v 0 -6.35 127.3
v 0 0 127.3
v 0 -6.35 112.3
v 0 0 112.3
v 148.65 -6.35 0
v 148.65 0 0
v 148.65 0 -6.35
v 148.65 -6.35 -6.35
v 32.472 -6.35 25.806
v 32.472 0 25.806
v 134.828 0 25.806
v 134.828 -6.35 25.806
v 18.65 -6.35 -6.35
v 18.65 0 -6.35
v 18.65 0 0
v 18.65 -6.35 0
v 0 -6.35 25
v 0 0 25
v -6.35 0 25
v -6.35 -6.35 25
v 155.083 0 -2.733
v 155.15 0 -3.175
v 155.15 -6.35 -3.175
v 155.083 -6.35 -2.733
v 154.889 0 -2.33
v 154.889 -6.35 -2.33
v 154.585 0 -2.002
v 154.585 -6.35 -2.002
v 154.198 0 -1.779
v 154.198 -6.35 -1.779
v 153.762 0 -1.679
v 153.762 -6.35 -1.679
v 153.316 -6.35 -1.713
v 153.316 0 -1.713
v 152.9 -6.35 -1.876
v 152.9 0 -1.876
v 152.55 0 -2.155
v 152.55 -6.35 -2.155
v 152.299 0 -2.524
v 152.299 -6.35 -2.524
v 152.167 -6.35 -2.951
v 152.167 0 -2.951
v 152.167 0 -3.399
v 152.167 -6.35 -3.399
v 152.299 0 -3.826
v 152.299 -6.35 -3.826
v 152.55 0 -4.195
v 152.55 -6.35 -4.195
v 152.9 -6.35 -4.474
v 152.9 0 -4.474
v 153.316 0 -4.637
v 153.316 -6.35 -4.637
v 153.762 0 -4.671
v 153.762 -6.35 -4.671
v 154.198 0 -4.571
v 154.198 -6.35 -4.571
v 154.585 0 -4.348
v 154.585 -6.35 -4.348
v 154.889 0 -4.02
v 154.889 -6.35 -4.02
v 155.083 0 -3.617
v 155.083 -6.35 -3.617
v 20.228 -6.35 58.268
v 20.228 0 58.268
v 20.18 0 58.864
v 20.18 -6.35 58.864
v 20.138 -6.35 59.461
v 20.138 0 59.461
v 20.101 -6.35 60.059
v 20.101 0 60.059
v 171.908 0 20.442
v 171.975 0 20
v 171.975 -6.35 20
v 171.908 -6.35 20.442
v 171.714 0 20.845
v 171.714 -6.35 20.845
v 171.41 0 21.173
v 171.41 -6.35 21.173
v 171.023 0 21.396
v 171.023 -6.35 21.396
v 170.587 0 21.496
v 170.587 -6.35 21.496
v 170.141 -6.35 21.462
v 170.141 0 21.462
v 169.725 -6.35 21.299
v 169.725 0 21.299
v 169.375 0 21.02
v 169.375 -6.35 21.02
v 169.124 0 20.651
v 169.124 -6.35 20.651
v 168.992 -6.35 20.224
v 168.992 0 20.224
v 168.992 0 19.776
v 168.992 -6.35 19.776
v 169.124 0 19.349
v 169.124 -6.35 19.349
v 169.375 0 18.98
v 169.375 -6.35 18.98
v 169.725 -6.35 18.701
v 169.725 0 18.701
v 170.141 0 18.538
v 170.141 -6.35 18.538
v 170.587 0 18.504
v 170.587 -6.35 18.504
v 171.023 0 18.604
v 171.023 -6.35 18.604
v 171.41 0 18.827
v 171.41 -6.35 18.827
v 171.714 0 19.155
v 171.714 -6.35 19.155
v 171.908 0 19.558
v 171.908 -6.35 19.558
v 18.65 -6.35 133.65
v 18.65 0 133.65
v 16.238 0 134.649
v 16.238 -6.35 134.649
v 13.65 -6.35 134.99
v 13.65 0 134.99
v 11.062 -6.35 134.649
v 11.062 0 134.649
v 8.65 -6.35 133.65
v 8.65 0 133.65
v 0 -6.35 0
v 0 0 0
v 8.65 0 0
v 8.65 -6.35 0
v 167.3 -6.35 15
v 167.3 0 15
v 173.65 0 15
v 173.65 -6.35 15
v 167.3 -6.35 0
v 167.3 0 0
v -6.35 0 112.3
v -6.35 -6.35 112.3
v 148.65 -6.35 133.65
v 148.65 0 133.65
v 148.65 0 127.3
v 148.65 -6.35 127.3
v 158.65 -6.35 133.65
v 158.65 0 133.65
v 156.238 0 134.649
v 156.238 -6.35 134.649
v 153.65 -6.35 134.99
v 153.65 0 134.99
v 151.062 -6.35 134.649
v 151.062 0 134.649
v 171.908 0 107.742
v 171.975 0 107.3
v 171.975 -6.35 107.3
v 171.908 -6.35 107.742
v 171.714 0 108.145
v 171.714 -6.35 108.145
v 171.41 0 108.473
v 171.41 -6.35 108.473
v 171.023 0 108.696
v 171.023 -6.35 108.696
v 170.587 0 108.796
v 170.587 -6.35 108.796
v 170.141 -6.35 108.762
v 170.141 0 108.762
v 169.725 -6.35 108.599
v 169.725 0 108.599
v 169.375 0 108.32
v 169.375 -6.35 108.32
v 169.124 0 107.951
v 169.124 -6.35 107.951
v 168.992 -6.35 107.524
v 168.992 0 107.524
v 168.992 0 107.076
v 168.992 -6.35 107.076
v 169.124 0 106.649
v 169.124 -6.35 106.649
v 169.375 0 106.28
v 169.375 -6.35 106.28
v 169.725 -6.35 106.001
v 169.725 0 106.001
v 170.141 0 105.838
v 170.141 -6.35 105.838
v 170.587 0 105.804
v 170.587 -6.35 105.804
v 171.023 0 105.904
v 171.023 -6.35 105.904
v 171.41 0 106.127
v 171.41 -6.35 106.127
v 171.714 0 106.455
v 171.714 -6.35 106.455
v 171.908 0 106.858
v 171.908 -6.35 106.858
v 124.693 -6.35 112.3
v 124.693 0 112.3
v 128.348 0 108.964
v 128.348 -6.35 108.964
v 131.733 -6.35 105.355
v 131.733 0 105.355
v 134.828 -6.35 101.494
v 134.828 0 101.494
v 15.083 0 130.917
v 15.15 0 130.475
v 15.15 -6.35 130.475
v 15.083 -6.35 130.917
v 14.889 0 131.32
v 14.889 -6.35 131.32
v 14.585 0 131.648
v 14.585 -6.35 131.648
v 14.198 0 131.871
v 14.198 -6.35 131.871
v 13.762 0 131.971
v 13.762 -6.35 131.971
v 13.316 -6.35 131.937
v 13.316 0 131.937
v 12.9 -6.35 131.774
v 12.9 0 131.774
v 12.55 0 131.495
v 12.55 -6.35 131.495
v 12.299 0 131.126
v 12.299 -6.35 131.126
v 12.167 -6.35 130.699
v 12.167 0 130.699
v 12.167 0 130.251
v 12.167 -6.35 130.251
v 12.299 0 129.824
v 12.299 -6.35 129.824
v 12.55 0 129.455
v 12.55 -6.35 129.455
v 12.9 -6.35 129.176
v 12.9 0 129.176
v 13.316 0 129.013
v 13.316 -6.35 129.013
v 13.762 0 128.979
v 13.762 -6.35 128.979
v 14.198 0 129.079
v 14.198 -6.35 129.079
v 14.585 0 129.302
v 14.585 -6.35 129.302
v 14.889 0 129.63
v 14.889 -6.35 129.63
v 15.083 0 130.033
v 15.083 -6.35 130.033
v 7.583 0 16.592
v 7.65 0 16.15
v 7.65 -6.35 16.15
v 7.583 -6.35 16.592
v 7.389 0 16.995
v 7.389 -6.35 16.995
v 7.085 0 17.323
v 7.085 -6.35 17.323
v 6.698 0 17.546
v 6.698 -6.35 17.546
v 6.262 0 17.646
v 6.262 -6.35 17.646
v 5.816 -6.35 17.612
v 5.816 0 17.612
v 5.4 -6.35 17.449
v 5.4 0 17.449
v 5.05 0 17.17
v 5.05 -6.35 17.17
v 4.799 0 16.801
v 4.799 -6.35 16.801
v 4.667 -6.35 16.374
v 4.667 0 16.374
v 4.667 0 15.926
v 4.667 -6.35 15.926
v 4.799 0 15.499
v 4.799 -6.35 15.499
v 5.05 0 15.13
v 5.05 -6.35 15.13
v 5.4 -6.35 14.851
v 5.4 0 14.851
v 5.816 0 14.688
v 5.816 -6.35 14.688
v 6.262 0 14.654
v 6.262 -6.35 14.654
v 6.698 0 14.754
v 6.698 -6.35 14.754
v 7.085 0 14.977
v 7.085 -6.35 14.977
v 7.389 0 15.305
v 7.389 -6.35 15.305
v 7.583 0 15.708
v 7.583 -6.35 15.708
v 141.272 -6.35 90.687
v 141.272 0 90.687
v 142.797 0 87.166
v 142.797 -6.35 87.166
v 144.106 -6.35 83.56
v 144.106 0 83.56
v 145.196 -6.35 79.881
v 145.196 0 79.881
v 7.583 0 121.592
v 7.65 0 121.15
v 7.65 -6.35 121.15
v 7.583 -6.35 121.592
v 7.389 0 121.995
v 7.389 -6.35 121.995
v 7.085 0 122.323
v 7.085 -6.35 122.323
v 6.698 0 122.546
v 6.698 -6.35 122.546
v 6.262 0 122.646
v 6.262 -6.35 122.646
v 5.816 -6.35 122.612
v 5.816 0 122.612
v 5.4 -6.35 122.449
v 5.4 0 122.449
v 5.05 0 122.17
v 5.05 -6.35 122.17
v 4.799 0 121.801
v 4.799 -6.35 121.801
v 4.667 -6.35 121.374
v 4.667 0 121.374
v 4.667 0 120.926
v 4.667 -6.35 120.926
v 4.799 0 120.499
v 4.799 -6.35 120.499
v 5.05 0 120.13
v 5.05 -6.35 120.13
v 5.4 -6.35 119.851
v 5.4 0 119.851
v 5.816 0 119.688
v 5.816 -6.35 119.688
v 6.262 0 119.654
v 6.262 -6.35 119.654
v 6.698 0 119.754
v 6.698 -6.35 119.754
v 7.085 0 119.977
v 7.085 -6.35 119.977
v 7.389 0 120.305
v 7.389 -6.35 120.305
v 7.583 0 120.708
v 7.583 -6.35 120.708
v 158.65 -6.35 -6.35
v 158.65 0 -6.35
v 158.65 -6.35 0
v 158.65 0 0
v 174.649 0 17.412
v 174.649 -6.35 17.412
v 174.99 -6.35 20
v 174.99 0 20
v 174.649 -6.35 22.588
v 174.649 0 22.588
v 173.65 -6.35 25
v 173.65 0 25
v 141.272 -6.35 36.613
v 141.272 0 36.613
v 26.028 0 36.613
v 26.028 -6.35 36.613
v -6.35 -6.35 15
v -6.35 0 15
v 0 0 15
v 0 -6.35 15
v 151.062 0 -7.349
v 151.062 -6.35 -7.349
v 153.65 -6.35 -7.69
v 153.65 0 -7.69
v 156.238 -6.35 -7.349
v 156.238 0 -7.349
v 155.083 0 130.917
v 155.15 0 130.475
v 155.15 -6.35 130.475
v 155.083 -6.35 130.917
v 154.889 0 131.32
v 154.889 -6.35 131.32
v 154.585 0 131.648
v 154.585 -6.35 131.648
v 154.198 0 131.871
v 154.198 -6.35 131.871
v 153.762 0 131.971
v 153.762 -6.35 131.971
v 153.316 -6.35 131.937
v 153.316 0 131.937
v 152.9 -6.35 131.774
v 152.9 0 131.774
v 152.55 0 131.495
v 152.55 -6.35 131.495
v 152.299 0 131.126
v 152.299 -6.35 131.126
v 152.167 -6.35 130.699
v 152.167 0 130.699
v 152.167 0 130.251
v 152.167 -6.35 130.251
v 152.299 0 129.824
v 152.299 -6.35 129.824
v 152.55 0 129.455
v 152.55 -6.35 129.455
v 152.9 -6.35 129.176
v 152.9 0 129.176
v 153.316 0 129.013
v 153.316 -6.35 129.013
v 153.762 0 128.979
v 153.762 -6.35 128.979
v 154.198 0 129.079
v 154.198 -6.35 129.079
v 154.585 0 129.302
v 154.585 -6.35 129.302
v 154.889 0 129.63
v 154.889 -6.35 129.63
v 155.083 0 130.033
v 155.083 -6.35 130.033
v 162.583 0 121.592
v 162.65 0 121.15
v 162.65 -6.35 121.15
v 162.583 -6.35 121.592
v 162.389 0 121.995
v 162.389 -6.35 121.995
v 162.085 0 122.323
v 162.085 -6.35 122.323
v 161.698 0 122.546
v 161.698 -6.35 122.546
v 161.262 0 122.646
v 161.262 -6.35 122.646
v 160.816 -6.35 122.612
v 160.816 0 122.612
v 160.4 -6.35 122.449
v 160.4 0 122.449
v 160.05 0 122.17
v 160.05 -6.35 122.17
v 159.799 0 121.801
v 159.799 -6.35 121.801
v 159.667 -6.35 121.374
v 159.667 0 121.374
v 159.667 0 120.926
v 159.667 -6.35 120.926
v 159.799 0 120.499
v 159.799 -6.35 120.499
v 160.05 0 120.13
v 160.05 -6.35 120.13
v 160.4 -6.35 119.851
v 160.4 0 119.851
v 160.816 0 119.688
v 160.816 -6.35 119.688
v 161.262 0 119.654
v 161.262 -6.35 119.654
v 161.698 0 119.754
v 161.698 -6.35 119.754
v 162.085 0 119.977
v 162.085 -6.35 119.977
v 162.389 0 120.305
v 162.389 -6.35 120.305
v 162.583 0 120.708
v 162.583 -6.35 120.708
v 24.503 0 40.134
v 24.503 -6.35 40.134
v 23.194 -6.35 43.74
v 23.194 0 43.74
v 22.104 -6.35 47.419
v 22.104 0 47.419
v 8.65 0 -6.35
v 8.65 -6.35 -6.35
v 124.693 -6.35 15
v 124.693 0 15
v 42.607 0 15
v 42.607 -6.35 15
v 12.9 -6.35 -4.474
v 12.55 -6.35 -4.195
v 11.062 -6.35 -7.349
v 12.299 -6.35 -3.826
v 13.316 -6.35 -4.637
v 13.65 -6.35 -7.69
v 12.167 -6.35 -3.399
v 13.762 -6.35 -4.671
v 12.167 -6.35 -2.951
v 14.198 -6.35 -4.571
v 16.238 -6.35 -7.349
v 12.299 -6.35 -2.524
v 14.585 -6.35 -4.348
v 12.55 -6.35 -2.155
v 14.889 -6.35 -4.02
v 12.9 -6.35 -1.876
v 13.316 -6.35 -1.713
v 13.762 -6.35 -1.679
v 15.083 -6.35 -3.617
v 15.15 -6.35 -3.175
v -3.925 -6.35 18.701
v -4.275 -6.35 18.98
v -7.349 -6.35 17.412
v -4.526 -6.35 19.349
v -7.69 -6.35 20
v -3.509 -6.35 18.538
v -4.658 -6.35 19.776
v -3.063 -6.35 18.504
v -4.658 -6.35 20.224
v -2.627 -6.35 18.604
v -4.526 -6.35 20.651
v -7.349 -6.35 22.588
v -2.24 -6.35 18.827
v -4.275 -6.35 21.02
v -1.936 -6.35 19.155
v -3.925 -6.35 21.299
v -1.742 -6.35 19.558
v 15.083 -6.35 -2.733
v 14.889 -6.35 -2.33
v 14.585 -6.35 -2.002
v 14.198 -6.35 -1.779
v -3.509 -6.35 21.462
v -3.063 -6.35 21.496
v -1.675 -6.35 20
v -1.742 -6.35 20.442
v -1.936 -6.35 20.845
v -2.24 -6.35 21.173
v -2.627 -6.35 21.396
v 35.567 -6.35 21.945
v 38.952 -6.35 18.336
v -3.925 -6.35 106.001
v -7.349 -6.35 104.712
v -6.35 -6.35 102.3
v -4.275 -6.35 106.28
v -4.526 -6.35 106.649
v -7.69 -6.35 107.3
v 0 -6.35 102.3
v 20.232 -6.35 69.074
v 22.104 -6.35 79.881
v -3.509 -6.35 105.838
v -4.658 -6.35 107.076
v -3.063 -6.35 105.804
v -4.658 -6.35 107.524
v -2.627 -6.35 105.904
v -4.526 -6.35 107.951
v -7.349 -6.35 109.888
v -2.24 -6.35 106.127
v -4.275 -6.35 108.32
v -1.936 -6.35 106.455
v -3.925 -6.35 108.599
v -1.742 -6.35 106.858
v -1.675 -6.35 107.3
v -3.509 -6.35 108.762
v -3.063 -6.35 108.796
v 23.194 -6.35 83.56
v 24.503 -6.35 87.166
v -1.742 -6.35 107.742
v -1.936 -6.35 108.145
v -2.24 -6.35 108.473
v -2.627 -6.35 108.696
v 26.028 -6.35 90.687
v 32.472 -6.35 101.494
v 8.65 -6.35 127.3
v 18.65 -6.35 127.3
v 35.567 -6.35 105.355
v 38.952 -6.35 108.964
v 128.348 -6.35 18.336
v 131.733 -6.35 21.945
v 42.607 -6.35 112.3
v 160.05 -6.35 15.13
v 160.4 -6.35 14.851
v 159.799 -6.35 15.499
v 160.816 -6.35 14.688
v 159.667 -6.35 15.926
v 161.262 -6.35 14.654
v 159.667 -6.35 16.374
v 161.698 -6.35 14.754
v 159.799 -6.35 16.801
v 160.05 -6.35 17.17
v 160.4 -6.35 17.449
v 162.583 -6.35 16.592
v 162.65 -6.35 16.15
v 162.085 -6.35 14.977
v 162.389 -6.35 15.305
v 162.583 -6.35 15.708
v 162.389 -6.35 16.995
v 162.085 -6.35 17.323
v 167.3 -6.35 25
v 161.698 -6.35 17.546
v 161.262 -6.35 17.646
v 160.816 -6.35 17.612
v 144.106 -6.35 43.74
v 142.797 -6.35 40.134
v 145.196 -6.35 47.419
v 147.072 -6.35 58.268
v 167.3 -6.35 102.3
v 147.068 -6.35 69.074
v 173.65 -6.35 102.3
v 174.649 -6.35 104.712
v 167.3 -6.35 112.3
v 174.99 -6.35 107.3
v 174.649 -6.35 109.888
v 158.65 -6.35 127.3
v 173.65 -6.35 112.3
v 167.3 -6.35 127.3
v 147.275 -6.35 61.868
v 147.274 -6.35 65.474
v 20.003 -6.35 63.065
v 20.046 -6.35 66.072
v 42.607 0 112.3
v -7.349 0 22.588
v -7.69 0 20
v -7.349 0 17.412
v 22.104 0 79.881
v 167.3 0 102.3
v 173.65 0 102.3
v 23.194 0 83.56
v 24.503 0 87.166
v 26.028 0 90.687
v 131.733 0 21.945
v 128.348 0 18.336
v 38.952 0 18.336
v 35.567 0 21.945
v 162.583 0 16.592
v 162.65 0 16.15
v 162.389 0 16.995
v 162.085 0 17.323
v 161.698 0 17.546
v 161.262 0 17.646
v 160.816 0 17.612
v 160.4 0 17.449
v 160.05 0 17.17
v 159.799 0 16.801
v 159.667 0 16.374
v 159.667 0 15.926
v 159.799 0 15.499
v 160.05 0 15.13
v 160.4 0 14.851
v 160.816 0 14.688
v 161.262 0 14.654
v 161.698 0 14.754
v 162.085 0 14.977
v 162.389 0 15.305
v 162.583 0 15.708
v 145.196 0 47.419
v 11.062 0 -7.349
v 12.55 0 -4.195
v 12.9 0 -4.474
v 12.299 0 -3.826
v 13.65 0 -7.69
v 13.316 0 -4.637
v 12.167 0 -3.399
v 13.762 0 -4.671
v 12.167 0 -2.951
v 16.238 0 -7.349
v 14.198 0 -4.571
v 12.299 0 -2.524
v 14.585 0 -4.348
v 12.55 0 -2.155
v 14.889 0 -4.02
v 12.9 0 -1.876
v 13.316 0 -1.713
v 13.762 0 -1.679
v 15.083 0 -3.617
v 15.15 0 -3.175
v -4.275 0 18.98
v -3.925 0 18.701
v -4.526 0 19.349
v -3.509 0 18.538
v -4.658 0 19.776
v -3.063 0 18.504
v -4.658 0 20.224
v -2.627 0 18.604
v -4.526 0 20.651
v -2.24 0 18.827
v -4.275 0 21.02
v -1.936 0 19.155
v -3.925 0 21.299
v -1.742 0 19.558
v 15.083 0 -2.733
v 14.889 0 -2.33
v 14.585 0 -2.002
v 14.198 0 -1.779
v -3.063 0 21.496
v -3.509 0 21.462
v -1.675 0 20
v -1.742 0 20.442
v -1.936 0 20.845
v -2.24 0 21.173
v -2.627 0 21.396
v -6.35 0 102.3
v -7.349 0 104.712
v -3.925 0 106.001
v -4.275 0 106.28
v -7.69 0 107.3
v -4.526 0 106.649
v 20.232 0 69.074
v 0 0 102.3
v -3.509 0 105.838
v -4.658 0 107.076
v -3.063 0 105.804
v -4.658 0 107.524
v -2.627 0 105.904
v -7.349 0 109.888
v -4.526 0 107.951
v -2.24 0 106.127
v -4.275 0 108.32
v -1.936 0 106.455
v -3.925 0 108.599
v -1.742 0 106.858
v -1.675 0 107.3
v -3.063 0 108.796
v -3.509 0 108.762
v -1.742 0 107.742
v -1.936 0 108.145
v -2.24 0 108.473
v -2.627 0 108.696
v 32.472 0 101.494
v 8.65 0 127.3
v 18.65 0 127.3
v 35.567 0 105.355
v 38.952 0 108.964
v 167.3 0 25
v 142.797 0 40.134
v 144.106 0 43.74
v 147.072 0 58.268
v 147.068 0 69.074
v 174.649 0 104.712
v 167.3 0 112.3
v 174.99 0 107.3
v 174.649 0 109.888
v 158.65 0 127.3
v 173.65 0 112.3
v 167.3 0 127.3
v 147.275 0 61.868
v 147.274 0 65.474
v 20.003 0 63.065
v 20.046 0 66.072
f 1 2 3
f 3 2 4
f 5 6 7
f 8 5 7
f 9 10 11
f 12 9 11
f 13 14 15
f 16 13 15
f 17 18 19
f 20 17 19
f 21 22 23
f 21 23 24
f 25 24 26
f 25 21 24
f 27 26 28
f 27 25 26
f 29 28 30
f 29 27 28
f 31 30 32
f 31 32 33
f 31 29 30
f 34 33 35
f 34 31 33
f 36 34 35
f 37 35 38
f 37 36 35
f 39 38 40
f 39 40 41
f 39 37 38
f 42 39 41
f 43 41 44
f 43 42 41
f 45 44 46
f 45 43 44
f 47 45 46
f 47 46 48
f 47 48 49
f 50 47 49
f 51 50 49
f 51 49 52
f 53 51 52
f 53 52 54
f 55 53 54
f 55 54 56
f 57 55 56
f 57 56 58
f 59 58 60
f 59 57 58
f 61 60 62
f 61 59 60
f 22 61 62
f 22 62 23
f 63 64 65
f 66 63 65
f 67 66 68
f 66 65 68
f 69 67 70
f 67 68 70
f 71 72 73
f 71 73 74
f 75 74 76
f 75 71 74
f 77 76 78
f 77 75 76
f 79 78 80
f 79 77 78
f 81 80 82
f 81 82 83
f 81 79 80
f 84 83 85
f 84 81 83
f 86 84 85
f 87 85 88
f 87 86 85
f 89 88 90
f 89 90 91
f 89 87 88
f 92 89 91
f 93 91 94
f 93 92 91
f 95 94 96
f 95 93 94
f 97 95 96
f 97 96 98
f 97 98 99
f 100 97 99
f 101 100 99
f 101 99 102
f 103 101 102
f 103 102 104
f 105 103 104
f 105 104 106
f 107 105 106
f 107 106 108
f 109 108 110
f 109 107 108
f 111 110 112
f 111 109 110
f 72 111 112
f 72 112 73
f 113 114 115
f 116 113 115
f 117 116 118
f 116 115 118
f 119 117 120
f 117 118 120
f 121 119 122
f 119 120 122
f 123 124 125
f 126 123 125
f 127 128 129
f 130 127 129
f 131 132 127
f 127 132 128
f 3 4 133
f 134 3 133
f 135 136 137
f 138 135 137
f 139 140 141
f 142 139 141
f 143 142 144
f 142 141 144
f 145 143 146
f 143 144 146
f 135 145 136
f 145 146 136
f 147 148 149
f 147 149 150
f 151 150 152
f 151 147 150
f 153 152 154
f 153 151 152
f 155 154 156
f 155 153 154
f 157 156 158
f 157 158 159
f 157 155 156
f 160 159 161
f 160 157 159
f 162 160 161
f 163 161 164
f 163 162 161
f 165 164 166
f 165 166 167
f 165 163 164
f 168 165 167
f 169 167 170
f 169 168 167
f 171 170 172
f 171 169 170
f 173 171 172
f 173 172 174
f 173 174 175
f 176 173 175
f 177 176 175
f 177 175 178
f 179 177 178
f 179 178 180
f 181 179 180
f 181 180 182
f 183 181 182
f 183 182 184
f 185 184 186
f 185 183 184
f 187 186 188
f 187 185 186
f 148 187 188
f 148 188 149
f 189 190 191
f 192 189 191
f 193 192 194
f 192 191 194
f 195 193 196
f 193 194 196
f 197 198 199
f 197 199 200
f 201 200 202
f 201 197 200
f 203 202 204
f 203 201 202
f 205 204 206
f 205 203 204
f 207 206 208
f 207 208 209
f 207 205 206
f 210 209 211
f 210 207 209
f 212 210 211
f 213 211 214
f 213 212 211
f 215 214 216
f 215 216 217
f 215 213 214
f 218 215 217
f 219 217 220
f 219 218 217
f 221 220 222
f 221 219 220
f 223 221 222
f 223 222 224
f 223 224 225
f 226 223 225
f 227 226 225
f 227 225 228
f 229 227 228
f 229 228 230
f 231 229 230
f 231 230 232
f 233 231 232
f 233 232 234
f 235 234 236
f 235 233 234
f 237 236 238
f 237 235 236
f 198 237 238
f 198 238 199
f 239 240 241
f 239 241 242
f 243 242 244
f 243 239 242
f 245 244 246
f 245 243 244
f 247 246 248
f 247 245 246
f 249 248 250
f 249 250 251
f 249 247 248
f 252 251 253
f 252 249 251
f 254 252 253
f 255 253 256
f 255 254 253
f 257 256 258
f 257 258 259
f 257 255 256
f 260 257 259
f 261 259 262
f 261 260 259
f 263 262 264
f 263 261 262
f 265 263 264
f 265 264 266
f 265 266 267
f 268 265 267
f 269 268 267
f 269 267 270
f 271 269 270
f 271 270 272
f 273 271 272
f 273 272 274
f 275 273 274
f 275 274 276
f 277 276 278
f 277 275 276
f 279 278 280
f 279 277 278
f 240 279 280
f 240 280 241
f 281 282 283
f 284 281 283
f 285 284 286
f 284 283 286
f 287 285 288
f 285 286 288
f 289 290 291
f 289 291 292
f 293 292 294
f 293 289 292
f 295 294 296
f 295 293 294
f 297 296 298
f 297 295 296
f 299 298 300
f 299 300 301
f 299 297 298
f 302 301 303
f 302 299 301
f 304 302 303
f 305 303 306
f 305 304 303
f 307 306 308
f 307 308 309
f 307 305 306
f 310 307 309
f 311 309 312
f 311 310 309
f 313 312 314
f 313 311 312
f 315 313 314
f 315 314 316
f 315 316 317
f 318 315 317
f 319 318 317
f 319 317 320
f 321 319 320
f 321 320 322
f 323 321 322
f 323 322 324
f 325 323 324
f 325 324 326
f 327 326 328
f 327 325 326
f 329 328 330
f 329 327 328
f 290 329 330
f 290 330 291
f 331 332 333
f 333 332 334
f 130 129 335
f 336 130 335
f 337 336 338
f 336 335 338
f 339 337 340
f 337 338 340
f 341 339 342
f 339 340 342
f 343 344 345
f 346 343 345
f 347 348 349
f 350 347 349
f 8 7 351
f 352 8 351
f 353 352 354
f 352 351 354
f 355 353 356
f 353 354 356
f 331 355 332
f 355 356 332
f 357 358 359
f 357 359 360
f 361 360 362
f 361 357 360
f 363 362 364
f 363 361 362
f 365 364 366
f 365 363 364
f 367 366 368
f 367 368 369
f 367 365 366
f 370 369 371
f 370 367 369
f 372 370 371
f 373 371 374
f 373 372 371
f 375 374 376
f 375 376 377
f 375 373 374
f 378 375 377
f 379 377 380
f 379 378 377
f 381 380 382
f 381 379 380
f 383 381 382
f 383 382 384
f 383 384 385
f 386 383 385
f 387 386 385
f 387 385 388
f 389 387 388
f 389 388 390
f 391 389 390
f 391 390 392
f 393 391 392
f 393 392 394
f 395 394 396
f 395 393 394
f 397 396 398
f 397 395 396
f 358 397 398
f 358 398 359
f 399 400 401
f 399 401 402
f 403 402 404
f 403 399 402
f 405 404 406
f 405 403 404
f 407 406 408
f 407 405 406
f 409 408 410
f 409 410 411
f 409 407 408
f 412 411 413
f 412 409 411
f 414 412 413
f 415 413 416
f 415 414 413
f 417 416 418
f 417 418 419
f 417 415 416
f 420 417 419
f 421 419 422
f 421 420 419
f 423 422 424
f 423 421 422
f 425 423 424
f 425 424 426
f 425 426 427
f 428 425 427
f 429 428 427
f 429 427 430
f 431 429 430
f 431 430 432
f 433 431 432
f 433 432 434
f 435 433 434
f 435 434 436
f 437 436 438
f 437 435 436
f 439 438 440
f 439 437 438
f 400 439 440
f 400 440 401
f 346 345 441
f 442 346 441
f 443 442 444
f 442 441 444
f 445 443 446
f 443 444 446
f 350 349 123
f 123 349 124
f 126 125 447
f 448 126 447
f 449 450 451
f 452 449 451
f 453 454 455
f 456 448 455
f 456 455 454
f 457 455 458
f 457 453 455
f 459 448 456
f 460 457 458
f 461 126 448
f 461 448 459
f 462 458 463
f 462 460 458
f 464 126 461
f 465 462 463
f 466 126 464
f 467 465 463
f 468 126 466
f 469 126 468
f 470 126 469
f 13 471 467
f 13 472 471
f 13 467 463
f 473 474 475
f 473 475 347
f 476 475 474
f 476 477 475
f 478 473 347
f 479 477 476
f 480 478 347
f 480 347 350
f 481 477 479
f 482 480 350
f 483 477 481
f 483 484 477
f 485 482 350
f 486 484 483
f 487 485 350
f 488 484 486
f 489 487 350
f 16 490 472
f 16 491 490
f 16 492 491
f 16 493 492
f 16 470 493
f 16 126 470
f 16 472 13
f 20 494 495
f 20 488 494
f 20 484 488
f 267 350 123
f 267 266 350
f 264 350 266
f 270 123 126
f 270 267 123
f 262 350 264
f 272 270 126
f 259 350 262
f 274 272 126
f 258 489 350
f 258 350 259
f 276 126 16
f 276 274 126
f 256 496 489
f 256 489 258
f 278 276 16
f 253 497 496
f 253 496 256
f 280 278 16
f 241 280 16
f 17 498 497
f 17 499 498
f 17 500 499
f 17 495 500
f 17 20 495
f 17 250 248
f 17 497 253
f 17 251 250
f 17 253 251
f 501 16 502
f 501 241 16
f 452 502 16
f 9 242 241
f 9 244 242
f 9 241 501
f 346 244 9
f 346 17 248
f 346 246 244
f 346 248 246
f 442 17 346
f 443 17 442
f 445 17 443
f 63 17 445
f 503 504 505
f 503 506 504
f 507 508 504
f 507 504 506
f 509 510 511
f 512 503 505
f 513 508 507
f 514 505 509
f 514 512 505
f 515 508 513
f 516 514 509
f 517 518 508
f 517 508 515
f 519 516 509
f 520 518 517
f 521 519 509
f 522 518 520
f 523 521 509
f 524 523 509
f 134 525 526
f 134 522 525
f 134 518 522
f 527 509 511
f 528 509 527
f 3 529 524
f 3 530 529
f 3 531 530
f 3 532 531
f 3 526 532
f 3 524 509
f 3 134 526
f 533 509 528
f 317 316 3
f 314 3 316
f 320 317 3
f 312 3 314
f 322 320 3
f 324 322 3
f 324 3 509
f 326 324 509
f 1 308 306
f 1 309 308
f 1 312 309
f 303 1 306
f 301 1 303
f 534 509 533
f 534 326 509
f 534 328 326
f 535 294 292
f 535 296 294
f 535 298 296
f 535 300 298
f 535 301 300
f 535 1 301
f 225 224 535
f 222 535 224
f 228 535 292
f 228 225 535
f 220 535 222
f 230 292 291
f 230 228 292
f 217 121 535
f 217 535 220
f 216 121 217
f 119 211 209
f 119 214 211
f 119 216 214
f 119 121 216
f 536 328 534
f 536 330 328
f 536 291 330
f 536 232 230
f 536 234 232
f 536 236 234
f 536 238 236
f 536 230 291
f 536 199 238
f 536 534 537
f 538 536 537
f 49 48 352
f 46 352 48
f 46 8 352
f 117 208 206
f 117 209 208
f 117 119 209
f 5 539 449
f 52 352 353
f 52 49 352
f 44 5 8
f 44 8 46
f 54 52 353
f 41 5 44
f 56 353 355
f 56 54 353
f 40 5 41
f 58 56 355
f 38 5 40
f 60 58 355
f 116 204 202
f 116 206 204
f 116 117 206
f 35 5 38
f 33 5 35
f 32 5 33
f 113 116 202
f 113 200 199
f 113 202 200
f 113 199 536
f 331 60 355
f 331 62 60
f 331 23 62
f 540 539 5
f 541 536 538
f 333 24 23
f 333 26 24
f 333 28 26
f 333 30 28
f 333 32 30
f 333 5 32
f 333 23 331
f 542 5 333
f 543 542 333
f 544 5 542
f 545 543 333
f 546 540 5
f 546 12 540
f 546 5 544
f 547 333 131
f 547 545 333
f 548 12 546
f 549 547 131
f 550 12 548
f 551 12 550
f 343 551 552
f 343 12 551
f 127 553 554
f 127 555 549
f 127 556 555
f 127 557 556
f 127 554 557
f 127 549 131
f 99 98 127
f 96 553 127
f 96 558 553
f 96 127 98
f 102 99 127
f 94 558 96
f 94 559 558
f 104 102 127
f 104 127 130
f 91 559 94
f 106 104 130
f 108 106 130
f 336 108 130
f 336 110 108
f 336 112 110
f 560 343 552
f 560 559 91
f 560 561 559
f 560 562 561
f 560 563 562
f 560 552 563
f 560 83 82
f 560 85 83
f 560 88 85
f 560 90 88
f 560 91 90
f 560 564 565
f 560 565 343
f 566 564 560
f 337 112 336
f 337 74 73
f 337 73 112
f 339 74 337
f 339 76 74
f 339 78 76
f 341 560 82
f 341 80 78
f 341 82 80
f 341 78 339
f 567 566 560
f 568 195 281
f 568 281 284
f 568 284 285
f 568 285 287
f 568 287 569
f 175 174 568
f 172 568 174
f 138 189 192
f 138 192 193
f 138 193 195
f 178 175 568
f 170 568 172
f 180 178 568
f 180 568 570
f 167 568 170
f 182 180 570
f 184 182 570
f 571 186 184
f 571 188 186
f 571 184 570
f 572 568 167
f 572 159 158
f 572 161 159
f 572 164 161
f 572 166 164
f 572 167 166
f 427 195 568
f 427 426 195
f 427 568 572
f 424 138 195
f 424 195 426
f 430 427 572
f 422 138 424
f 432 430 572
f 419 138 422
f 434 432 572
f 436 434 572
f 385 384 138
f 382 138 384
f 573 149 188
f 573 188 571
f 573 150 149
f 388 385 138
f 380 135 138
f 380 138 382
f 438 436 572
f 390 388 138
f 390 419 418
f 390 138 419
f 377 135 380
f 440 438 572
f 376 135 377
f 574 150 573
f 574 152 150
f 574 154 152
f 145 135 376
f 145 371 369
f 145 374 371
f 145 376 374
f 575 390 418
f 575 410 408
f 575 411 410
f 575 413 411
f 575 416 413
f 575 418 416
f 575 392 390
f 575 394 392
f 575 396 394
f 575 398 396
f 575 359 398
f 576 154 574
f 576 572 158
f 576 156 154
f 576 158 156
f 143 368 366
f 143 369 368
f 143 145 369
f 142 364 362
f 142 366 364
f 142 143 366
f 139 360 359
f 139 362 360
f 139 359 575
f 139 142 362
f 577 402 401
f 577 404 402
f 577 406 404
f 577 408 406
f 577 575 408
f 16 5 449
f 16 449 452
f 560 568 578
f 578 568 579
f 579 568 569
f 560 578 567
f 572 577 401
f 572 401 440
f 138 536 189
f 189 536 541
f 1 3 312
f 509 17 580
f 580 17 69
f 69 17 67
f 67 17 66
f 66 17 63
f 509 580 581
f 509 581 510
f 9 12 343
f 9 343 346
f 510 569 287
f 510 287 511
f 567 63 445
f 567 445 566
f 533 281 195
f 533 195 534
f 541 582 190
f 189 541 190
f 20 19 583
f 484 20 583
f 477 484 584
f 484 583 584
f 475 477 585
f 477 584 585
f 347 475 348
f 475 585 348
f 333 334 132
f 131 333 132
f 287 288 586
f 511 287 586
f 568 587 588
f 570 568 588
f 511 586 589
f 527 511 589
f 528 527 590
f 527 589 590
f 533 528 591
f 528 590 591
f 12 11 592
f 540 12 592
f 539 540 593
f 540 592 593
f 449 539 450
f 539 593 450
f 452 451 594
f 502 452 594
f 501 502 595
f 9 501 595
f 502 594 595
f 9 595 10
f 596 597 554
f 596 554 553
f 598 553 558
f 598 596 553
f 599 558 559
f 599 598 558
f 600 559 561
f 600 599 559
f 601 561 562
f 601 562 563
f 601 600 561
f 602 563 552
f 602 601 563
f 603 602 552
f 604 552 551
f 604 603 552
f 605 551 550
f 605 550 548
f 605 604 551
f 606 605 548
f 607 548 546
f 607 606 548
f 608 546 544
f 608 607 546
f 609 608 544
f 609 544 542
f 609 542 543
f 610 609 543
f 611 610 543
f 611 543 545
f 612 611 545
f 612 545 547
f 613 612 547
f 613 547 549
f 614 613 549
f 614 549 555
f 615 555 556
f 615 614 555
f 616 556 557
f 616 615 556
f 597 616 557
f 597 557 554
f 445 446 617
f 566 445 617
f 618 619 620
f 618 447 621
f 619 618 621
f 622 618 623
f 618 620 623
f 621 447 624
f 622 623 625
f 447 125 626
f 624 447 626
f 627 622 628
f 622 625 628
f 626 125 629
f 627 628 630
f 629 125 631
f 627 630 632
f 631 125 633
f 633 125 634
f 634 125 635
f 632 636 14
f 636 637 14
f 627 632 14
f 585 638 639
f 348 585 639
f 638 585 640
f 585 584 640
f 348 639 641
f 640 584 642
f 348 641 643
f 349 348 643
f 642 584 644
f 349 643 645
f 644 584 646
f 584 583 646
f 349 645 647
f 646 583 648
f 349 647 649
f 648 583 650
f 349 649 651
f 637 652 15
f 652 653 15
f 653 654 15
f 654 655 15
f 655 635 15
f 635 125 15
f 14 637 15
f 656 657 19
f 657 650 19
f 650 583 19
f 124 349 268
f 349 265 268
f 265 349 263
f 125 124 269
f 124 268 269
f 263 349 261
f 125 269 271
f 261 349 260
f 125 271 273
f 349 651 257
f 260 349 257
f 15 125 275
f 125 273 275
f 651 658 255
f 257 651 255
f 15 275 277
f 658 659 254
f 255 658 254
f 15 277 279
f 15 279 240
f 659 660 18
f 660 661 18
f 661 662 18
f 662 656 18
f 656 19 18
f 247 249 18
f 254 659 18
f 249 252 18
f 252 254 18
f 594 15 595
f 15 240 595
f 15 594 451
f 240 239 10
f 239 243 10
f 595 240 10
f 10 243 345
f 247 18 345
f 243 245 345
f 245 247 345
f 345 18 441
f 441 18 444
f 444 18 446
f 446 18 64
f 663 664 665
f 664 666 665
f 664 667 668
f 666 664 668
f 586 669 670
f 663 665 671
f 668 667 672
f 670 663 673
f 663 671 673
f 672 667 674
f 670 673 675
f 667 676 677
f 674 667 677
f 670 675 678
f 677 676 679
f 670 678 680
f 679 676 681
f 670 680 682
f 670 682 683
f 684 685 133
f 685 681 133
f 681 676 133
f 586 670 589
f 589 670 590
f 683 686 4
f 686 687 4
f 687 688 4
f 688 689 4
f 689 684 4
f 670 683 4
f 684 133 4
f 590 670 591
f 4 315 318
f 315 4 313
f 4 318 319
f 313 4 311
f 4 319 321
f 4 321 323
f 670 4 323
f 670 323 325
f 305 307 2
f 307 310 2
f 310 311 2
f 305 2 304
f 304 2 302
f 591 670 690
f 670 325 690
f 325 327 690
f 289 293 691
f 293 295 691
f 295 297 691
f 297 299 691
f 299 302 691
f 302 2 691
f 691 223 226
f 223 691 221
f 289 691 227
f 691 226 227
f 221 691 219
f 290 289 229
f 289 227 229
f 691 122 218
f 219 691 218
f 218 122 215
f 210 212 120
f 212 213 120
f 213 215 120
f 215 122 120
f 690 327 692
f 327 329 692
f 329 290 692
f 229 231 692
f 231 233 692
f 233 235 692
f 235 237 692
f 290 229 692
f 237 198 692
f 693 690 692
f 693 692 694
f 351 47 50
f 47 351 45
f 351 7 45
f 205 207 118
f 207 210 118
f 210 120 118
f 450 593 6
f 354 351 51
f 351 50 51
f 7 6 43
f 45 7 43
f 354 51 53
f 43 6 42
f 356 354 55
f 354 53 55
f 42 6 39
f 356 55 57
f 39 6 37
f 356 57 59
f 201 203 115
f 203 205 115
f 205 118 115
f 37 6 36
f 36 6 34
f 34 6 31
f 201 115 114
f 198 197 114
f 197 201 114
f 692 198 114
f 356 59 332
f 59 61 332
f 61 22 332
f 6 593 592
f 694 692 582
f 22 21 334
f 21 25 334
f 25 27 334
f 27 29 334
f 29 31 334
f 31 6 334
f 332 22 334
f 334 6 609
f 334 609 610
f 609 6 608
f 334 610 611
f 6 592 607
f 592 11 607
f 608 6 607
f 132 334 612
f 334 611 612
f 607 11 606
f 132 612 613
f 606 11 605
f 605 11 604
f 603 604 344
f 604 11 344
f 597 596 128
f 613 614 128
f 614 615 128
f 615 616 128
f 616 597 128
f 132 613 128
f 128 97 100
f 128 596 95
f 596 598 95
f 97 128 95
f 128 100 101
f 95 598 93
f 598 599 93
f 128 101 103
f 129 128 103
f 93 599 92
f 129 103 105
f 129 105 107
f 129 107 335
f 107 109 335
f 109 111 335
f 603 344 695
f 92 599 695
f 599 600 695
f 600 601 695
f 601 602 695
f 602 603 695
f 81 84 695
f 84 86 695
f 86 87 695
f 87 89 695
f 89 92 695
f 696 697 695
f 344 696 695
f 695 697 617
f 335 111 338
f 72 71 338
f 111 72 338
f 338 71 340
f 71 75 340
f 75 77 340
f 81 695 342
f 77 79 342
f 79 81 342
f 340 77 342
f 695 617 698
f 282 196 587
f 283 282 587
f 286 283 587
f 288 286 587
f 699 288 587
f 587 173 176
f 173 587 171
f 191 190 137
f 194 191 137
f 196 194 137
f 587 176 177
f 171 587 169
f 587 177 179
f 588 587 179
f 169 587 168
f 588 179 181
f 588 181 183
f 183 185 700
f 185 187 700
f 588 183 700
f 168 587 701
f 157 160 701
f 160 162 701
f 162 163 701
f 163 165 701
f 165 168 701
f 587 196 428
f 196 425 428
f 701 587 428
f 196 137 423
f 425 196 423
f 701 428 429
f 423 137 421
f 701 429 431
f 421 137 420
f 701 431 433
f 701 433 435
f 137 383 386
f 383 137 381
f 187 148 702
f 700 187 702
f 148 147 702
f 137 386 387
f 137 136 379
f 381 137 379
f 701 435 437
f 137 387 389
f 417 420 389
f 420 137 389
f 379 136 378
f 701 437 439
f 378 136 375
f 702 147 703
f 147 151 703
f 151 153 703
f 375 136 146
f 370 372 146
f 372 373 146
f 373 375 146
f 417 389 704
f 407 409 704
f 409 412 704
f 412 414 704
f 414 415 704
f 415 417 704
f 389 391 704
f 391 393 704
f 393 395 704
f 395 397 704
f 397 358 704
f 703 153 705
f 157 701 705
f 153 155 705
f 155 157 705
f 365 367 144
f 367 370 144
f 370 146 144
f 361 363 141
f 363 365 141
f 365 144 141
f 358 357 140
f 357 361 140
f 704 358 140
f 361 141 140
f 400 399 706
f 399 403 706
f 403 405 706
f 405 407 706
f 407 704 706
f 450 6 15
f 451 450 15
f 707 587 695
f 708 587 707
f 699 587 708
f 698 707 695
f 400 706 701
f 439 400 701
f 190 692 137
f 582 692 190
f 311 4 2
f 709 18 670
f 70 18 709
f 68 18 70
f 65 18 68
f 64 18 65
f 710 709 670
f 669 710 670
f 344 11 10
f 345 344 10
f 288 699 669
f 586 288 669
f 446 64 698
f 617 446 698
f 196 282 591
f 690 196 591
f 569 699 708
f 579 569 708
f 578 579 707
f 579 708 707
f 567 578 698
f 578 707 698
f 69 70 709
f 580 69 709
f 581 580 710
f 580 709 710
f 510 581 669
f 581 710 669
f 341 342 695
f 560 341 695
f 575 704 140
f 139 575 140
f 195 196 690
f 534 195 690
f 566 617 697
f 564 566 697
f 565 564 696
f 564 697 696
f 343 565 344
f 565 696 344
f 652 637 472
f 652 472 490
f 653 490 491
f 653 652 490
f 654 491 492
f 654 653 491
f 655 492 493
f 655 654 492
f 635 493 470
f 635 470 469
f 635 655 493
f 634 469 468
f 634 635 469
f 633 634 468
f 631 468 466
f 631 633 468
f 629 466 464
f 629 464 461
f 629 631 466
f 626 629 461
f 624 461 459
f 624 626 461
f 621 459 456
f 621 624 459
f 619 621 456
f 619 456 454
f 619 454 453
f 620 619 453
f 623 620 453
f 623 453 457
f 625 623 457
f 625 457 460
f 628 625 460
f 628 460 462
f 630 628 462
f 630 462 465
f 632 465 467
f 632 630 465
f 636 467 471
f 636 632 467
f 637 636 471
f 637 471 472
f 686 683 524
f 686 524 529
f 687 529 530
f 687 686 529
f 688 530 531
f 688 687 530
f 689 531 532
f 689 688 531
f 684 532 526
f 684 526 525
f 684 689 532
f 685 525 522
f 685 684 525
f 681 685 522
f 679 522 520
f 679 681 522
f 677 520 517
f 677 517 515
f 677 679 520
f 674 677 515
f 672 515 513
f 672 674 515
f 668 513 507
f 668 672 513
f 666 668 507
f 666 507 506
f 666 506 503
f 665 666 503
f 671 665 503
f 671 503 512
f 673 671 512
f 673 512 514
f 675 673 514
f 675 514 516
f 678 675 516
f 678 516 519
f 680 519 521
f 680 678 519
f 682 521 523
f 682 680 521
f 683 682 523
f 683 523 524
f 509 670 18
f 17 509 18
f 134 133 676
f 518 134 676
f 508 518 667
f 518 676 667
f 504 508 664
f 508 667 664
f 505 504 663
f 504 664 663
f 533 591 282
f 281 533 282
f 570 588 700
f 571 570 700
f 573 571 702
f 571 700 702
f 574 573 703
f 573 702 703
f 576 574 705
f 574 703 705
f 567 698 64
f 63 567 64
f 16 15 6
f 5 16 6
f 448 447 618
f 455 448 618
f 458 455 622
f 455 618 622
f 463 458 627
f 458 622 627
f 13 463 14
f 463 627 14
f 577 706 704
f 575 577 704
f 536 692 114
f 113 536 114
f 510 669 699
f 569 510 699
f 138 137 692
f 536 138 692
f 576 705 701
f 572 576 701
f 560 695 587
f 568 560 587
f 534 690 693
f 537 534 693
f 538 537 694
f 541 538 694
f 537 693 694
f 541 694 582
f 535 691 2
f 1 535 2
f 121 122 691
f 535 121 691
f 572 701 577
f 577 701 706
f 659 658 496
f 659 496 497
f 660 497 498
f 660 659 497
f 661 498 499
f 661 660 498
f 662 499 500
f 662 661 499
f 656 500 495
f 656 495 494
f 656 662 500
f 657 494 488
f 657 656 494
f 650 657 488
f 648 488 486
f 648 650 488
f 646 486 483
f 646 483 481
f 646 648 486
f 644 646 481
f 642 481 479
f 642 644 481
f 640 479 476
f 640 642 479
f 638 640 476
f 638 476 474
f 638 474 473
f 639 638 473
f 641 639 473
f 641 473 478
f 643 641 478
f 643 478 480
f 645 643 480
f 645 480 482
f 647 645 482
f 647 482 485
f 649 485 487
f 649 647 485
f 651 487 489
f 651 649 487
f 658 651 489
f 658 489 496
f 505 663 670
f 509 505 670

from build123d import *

# Parameters (mm, degrees)
F0_R     = 1.5
F1_DEPTH = 6.35


with BuildPart() as f1:
    # F0 (on Front) → F1 (new body)
    with BuildSketch(Plane.XZ):
        with BuildLine():
            Line((0, 15), (0, 0))
            Line((0, 0), (8.65, 0))
            Line((8.65, 0), (8.65, -6.35))
            ThreePointArc((8.65, -6.35), (13.65, -7.689746), (18.65, -6.35))
            Line((18.65, -6.35), (18.65, 0))
            Line((18.65, 0), (148.65, 0))
            Line((148.65, 0), (148.65, -6.35))
            ThreePointArc((148.65, -6.35), (153.65, -7.689746), (158.65, -6.35))
            Line((158.65, -6.35), (158.65, -6.289838))
            Line((158.65, -6.289838), (158.65, 0))
            Line((158.65, 0), (167.3, 0))
            Line((167.3, 0), (167.3, 15))
            Line((167.3, 15), (173.65, 15))
            ThreePointArc((173.65, 15), (174.989746, 20), (173.65, 25))
            Line((173.65, 25), (167.3, 25))
            Line((167.3, 25), (167.3, 102.3))
            Line((167.3, 102.3), (173.65, 102.3))
            ThreePointArc((173.65, 102.3), (174.989746, 107.3), (173.65, 112.3))
            Line((173.65, 112.3), (167.3, 112.3))
            Line((167.3, 112.3), (167.3, 127.3))
            Line((167.3, 127.3), (158.65, 127.3))
            Line((158.65, 127.3), (158.65, 133.65))
            ThreePointArc((158.65, 133.65), (153.65, 134.989746), (148.65, 133.65))
            Line((148.65, 133.65), (148.65, 127.3))
            Line((148.65, 127.3), (18.65, 127.3))
            Line((18.65, 127.3), (18.65, 133.65))
            ThreePointArc((18.65, 133.65), (13.65, 134.989746), (8.65, 133.65))
            Line((8.65, 133.65), (8.65, 127.3))
            Line((8.65, 127.3), (0, 127.3))
            Line((0, 127.3), (0, 112.3))
            Line((0, 112.3), (-6.35, 112.3))
            ThreePointArc((-6.35, 112.3), (-7.689746, 107.3), (-6.35, 102.3))
            Line((-6.35, 102.3), (0, 102.3))
            Line((0, 102.3), (0, 25))
            Line((0, 25), (-6.35, 25))
            ThreePointArc((-6.35, 25), (-7.689746, 20), (-6.35, 15))
            Line((-6.35, 15), (0, 15))
        make_face()
        with Locations((13.65, -3.175)):
            Circle(F0_R, mode=Mode.SUBTRACT)
        with Locations((6.15, 16.15)):
            Circle(F0_R, mode=Mode.SUBTRACT)
        with Locations((-3.175, 20)):
            Circle(F0_R, mode=Mode.SUBTRACT)
        with BuildLine():
            Line((32.471991, 25.806455), (134.828009, 25.806455))
            ThreePointArc((134.828009, 25.806455), (130.075832, 20.107324), (124.692661, 15))
            Line((124.692661, 15), (42.607339, 15))
            ThreePointArc((42.607339, 15), (37.224168, 20.107324), (32.471991, 25.806455))
        make_face(mode=Mode.SUBTRACT)
        with BuildLine():
            Line((22.104172, 47.419365), (145.195828, 47.419365))
            ThreePointArc((145.195828, 47.419365), (143.478503, 41.927369), (141.272203, 36.61291))
            Line((141.272203, 36.61291), (26.027797, 36.61291))
            ThreePointArc((26.027797, 36.61291), (23.821497, 41.927369), (22.104172, 47.419365))
        make_face(mode=Mode.SUBTRACT)
        with Locations((153.65, -3.175)):
            Circle(F0_R, mode=Mode.SUBTRACT)
        with Locations((161.15, 16.15)):
            Circle(F0_R, mode=Mode.SUBTRACT)
        with Locations((170.475, 20)):
            Circle(F0_R, mode=Mode.SUBTRACT)
        with BuildLine():
            ThreePointArc((20.1014, 60.058627), (20.006631, 64.568711), (20.231542, 69.074179))
            Line((20.231542, 69.074179), (147.068458, 69.074179))
            ThreePointArc((147.068458, 69.074179), (147.299997, 63.671028), (147.072028, 58.267724))
            Line((147.072028, 58.267724), (20.227972, 58.267724))
            ThreePointArc((20.227972, 58.267724), (20.158371, 59.162729), (20.1014, 60.058627))
        make_face(mode=Mode.SUBTRACT)
        with BuildLine():
            ThreePointArc((22.104172, 79.880635), (23.821497, 85.372631), (26.027797, 90.68709))
            Line((26.027797, 90.68709), (141.272203, 90.68709))
            ThreePointArc((141.272203, 90.68709), (143.478503, 85.372631), (145.195828, 79.880635))
            Line((145.195828, 79.880635), (22.104172, 79.880635))
        make_face(mode=Mode.SUBTRACT)
        with Locations((-3.175, 107.3)):
            Circle(F0_R, mode=Mode.SUBTRACT)
        with Locations((6.15, 121.15)):
            Circle(F0_R, mode=Mode.SUBTRACT)
        with Locations((13.65, 130.475)):
            Circle(F0_R, mode=Mode.SUBTRACT)
        with BuildLine():
            ThreePointArc((32.471991, 101.493545), (37.224168, 107.192676), (42.607339, 112.3))
            Line((42.607339, 112.3), (124.692661, 112.3))
            ThreePointArc((124.692661, 112.3), (130.075832, 107.192676), (134.828009, 101.493545))
            Line((134.828009, 101.493545), (32.471991, 101.493545))
        make_face(mode=Mode.SUBTRACT)
        with Locations((170.475, 107.3)):
            Circle(F0_R, mode=Mode.SUBTRACT)
        with Locations((161.15, 121.15)):
            Circle(F0_R, mode=Mode.SUBTRACT)
        with Locations((153.65, 130.475)):
            Circle(F0_R, mode=Mode.SUBTRACT)
    extrude(amount=F1_DEPTH)


solid = f1.part
